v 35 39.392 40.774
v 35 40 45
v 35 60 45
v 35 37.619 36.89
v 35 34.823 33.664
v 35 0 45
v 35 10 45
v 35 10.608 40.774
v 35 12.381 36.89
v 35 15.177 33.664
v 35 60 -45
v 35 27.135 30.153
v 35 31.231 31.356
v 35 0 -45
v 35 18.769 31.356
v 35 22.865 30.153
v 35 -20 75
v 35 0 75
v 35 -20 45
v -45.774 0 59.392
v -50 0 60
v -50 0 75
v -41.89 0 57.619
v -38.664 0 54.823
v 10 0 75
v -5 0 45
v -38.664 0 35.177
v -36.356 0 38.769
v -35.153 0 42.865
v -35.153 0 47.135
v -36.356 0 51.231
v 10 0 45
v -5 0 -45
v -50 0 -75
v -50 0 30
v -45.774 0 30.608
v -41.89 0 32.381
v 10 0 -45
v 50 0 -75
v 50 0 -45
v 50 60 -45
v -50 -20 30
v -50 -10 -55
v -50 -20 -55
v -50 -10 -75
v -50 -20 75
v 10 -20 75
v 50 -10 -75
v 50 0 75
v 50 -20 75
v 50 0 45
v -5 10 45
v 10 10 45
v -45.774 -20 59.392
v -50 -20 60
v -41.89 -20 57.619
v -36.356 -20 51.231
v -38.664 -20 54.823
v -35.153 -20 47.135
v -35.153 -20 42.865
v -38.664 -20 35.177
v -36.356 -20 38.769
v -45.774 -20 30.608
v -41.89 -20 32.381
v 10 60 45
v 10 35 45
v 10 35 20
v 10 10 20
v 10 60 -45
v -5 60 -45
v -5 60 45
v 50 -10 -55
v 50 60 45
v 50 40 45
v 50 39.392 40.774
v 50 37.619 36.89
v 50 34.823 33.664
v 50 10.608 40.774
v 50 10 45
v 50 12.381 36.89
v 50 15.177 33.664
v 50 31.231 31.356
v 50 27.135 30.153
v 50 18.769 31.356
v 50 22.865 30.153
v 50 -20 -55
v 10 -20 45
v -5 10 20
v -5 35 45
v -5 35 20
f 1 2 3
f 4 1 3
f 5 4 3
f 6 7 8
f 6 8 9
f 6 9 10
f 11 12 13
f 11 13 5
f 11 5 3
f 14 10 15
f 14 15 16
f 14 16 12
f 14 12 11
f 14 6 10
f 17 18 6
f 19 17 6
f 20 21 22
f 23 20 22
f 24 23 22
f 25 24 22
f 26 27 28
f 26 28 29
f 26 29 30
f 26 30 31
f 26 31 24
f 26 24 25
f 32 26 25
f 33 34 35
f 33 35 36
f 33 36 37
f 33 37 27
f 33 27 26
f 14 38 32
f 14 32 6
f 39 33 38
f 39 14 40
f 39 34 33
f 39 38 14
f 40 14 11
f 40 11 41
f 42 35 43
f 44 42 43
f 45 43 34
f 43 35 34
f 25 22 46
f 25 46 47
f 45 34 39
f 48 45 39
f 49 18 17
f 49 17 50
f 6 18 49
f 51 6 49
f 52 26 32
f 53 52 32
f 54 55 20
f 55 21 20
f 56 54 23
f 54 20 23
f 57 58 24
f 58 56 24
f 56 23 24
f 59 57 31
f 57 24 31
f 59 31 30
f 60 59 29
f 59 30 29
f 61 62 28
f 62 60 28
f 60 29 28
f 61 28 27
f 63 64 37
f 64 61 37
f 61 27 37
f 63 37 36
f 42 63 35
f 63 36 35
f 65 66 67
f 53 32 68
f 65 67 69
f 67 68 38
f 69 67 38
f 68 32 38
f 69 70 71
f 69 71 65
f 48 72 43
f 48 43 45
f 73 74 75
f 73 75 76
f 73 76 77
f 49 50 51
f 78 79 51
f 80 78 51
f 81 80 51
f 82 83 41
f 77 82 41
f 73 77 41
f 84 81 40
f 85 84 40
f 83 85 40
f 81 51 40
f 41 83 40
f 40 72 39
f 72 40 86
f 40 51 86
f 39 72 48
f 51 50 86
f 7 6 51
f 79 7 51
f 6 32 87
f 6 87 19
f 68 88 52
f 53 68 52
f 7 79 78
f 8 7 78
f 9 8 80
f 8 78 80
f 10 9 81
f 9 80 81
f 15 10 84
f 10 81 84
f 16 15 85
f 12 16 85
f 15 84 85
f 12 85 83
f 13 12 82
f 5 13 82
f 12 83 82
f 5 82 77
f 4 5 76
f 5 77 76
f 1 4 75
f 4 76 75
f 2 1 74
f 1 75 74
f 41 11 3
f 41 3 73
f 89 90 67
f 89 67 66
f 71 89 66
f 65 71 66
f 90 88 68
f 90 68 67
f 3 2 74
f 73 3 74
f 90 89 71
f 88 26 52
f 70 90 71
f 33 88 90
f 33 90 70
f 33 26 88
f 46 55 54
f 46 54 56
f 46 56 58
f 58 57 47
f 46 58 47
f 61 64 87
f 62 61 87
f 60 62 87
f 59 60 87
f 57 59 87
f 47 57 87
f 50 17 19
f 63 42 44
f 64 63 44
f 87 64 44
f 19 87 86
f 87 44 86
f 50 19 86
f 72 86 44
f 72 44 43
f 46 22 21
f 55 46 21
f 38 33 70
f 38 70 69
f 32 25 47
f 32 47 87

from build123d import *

# Parameters (mm, degrees)
SKETCH_1_W          = 100
SKETCH_1_H          = 150
EXTRUDE_1_DEPTH     = 20
SKETCH_2_R          = 15
CUT_EXTRUDE_1_DEPTH = 20
SKETCH_3_W          = 25
SKETCH_3_H          = 30
CUT_EXTRUDE_2_DEPTH = 20
SKETCH_4_W          = 15
SKETCH_4_H          = 90
EXTRUDE_2_DEPTH     = 60
SKETCH_6_W          = 15
SKETCH_6_H          = 90
EXTRUDE_3_DEPTH     = 60
CUT_EXTRUDE_3_REACH = 140.654
CUT_EXTRUDE_4_REACH = 112.68
SKETCH_9_W          = 25
SKETCH_9_H          = 25
SKETCH_10_W         = 20
SKETCH_10_H         = 10
CUT_EXTRUDE_5_DEPTH = 139.654246239


with BuildPart() as part:
    # Эскиз1 → Бобышка-Вытянуть1 (new body)
    with BuildSketch(Plane(origin=(0, 0, 0), x_dir=(1, 0, 0), z_dir=(0, 1, 0))):
        Rectangle(SKETCH_1_W, SKETCH_1_H)
    extrude(amount=-EXTRUDE_1_DEPTH)

    # Эскиз2 → Вырез-Вытянуть1 (cut)
    with BuildSketch(Plane(origin=(0, 0, 0), x_dir=(1, 0, 0), z_dir=(0, 1, 0))):
        with Locations((-50, -45)):
            Circle(SKETCH_2_R)
    extrude(amount=-CUT_EXTRUDE_1_DEPTH, mode=Mode.SUBTRACT)

    # Эскиз3 → Вырез-Вытянуть2 (cut)
    with BuildSketch(Plane(origin=(0, 0, 0), x_dir=(1, 0, 0), z_dir=(0, 1, 0))):
        with Locations((22.5, -60)):
            Rectangle(SKETCH_3_W, SKETCH_3_H)
    extrude(amount=-CUT_EXTRUDE_2_DEPTH, mode=Mode.SUBTRACT)

    # Эскиз4 → Бобышка-Вытянуть2 (add)
    with BuildSketch(Plane(origin=(0, 0, 0), x_dir=(1, 0, 0), z_dir=(0, 1, 0))):
        with Locations((2.5, 0)):
            Rectangle(SKETCH_4_W, SKETCH_4_H)
    extrude(amount=EXTRUDE_2_DEPTH)

    # Эскиз6 → Бобышка-Вытянуть3 (add)
    with BuildSketch(Plane(origin=(0, 0, 0), x_dir=(1, 0, 0), z_dir=(0, 1, 0))):
        with Locations((42.5, 0)):
            Rectangle(SKETCH_6_W, SKETCH_6_H)
    extrude(amount=EXTRUDE_3_DEPTH)

    # Эскиз7 → Вырез-Вытянуть3 (cut, up to next)
    with BuildSketch(Plane(origin=(50, 0, 0), x_dir=(0, 0, -1), z_dir=(1, 0, 0)), mode=Mode.PRIVATE) as cut_extrude_3_sk1:
        with BuildLine():
            Line((-45, 40), (-45, 10))
            ThreePointArc((-45, 10), (-30, 25), (-45, 40))
        make_face()
    cut_extrude_3_tool1 = extrude(cut_extrude_3_sk1.sketch, amount=-CUT_EXTRUDE_3_REACH, mode=Mode.PRIVATE) & part.part
    add(cut_extrude_3_tool1.solids().sort_by_distance((50, 25, 38.633802))[0], mode=Mode.SUBTRACT)

    # Эскиз9 → Вырез-Вытянуть4 (cut, up to next)
    with BuildSketch(Plane.ZY.offset(5), mode=Mode.PRIVATE) as cut_extrude_4_sk1:
        with Locations((32.5, 22.5)):
            Rectangle(SKETCH_9_W, SKETCH_9_H)
    cut_extrude_4_tool1 = extrude(cut_extrude_4_sk1.sketch, amount=-CUT_EXTRUDE_4_REACH, mode=Mode.PRIVATE) & part.part
    add(cut_extrude_4_tool1.solids().sort_by_distance((-5, 22.5, 32.5))[0], mode=Mode.SUBTRACT)

    # Эскиз10 → Вырез-Вытянуть5 (cut, through all)
    with BuildSketch(Plane(origin=(50, 0, 0), x_dir=(0, 0, -1), z_dir=(1, 0, 0))):
        with Locations((65, -15)):
            Rectangle(SKETCH_10_W, SKETCH_10_H)
    extrude(amount=-CUT_EXTRUDE_5_DEPTH, mode=Mode.SUBTRACT)


solid = part.part
